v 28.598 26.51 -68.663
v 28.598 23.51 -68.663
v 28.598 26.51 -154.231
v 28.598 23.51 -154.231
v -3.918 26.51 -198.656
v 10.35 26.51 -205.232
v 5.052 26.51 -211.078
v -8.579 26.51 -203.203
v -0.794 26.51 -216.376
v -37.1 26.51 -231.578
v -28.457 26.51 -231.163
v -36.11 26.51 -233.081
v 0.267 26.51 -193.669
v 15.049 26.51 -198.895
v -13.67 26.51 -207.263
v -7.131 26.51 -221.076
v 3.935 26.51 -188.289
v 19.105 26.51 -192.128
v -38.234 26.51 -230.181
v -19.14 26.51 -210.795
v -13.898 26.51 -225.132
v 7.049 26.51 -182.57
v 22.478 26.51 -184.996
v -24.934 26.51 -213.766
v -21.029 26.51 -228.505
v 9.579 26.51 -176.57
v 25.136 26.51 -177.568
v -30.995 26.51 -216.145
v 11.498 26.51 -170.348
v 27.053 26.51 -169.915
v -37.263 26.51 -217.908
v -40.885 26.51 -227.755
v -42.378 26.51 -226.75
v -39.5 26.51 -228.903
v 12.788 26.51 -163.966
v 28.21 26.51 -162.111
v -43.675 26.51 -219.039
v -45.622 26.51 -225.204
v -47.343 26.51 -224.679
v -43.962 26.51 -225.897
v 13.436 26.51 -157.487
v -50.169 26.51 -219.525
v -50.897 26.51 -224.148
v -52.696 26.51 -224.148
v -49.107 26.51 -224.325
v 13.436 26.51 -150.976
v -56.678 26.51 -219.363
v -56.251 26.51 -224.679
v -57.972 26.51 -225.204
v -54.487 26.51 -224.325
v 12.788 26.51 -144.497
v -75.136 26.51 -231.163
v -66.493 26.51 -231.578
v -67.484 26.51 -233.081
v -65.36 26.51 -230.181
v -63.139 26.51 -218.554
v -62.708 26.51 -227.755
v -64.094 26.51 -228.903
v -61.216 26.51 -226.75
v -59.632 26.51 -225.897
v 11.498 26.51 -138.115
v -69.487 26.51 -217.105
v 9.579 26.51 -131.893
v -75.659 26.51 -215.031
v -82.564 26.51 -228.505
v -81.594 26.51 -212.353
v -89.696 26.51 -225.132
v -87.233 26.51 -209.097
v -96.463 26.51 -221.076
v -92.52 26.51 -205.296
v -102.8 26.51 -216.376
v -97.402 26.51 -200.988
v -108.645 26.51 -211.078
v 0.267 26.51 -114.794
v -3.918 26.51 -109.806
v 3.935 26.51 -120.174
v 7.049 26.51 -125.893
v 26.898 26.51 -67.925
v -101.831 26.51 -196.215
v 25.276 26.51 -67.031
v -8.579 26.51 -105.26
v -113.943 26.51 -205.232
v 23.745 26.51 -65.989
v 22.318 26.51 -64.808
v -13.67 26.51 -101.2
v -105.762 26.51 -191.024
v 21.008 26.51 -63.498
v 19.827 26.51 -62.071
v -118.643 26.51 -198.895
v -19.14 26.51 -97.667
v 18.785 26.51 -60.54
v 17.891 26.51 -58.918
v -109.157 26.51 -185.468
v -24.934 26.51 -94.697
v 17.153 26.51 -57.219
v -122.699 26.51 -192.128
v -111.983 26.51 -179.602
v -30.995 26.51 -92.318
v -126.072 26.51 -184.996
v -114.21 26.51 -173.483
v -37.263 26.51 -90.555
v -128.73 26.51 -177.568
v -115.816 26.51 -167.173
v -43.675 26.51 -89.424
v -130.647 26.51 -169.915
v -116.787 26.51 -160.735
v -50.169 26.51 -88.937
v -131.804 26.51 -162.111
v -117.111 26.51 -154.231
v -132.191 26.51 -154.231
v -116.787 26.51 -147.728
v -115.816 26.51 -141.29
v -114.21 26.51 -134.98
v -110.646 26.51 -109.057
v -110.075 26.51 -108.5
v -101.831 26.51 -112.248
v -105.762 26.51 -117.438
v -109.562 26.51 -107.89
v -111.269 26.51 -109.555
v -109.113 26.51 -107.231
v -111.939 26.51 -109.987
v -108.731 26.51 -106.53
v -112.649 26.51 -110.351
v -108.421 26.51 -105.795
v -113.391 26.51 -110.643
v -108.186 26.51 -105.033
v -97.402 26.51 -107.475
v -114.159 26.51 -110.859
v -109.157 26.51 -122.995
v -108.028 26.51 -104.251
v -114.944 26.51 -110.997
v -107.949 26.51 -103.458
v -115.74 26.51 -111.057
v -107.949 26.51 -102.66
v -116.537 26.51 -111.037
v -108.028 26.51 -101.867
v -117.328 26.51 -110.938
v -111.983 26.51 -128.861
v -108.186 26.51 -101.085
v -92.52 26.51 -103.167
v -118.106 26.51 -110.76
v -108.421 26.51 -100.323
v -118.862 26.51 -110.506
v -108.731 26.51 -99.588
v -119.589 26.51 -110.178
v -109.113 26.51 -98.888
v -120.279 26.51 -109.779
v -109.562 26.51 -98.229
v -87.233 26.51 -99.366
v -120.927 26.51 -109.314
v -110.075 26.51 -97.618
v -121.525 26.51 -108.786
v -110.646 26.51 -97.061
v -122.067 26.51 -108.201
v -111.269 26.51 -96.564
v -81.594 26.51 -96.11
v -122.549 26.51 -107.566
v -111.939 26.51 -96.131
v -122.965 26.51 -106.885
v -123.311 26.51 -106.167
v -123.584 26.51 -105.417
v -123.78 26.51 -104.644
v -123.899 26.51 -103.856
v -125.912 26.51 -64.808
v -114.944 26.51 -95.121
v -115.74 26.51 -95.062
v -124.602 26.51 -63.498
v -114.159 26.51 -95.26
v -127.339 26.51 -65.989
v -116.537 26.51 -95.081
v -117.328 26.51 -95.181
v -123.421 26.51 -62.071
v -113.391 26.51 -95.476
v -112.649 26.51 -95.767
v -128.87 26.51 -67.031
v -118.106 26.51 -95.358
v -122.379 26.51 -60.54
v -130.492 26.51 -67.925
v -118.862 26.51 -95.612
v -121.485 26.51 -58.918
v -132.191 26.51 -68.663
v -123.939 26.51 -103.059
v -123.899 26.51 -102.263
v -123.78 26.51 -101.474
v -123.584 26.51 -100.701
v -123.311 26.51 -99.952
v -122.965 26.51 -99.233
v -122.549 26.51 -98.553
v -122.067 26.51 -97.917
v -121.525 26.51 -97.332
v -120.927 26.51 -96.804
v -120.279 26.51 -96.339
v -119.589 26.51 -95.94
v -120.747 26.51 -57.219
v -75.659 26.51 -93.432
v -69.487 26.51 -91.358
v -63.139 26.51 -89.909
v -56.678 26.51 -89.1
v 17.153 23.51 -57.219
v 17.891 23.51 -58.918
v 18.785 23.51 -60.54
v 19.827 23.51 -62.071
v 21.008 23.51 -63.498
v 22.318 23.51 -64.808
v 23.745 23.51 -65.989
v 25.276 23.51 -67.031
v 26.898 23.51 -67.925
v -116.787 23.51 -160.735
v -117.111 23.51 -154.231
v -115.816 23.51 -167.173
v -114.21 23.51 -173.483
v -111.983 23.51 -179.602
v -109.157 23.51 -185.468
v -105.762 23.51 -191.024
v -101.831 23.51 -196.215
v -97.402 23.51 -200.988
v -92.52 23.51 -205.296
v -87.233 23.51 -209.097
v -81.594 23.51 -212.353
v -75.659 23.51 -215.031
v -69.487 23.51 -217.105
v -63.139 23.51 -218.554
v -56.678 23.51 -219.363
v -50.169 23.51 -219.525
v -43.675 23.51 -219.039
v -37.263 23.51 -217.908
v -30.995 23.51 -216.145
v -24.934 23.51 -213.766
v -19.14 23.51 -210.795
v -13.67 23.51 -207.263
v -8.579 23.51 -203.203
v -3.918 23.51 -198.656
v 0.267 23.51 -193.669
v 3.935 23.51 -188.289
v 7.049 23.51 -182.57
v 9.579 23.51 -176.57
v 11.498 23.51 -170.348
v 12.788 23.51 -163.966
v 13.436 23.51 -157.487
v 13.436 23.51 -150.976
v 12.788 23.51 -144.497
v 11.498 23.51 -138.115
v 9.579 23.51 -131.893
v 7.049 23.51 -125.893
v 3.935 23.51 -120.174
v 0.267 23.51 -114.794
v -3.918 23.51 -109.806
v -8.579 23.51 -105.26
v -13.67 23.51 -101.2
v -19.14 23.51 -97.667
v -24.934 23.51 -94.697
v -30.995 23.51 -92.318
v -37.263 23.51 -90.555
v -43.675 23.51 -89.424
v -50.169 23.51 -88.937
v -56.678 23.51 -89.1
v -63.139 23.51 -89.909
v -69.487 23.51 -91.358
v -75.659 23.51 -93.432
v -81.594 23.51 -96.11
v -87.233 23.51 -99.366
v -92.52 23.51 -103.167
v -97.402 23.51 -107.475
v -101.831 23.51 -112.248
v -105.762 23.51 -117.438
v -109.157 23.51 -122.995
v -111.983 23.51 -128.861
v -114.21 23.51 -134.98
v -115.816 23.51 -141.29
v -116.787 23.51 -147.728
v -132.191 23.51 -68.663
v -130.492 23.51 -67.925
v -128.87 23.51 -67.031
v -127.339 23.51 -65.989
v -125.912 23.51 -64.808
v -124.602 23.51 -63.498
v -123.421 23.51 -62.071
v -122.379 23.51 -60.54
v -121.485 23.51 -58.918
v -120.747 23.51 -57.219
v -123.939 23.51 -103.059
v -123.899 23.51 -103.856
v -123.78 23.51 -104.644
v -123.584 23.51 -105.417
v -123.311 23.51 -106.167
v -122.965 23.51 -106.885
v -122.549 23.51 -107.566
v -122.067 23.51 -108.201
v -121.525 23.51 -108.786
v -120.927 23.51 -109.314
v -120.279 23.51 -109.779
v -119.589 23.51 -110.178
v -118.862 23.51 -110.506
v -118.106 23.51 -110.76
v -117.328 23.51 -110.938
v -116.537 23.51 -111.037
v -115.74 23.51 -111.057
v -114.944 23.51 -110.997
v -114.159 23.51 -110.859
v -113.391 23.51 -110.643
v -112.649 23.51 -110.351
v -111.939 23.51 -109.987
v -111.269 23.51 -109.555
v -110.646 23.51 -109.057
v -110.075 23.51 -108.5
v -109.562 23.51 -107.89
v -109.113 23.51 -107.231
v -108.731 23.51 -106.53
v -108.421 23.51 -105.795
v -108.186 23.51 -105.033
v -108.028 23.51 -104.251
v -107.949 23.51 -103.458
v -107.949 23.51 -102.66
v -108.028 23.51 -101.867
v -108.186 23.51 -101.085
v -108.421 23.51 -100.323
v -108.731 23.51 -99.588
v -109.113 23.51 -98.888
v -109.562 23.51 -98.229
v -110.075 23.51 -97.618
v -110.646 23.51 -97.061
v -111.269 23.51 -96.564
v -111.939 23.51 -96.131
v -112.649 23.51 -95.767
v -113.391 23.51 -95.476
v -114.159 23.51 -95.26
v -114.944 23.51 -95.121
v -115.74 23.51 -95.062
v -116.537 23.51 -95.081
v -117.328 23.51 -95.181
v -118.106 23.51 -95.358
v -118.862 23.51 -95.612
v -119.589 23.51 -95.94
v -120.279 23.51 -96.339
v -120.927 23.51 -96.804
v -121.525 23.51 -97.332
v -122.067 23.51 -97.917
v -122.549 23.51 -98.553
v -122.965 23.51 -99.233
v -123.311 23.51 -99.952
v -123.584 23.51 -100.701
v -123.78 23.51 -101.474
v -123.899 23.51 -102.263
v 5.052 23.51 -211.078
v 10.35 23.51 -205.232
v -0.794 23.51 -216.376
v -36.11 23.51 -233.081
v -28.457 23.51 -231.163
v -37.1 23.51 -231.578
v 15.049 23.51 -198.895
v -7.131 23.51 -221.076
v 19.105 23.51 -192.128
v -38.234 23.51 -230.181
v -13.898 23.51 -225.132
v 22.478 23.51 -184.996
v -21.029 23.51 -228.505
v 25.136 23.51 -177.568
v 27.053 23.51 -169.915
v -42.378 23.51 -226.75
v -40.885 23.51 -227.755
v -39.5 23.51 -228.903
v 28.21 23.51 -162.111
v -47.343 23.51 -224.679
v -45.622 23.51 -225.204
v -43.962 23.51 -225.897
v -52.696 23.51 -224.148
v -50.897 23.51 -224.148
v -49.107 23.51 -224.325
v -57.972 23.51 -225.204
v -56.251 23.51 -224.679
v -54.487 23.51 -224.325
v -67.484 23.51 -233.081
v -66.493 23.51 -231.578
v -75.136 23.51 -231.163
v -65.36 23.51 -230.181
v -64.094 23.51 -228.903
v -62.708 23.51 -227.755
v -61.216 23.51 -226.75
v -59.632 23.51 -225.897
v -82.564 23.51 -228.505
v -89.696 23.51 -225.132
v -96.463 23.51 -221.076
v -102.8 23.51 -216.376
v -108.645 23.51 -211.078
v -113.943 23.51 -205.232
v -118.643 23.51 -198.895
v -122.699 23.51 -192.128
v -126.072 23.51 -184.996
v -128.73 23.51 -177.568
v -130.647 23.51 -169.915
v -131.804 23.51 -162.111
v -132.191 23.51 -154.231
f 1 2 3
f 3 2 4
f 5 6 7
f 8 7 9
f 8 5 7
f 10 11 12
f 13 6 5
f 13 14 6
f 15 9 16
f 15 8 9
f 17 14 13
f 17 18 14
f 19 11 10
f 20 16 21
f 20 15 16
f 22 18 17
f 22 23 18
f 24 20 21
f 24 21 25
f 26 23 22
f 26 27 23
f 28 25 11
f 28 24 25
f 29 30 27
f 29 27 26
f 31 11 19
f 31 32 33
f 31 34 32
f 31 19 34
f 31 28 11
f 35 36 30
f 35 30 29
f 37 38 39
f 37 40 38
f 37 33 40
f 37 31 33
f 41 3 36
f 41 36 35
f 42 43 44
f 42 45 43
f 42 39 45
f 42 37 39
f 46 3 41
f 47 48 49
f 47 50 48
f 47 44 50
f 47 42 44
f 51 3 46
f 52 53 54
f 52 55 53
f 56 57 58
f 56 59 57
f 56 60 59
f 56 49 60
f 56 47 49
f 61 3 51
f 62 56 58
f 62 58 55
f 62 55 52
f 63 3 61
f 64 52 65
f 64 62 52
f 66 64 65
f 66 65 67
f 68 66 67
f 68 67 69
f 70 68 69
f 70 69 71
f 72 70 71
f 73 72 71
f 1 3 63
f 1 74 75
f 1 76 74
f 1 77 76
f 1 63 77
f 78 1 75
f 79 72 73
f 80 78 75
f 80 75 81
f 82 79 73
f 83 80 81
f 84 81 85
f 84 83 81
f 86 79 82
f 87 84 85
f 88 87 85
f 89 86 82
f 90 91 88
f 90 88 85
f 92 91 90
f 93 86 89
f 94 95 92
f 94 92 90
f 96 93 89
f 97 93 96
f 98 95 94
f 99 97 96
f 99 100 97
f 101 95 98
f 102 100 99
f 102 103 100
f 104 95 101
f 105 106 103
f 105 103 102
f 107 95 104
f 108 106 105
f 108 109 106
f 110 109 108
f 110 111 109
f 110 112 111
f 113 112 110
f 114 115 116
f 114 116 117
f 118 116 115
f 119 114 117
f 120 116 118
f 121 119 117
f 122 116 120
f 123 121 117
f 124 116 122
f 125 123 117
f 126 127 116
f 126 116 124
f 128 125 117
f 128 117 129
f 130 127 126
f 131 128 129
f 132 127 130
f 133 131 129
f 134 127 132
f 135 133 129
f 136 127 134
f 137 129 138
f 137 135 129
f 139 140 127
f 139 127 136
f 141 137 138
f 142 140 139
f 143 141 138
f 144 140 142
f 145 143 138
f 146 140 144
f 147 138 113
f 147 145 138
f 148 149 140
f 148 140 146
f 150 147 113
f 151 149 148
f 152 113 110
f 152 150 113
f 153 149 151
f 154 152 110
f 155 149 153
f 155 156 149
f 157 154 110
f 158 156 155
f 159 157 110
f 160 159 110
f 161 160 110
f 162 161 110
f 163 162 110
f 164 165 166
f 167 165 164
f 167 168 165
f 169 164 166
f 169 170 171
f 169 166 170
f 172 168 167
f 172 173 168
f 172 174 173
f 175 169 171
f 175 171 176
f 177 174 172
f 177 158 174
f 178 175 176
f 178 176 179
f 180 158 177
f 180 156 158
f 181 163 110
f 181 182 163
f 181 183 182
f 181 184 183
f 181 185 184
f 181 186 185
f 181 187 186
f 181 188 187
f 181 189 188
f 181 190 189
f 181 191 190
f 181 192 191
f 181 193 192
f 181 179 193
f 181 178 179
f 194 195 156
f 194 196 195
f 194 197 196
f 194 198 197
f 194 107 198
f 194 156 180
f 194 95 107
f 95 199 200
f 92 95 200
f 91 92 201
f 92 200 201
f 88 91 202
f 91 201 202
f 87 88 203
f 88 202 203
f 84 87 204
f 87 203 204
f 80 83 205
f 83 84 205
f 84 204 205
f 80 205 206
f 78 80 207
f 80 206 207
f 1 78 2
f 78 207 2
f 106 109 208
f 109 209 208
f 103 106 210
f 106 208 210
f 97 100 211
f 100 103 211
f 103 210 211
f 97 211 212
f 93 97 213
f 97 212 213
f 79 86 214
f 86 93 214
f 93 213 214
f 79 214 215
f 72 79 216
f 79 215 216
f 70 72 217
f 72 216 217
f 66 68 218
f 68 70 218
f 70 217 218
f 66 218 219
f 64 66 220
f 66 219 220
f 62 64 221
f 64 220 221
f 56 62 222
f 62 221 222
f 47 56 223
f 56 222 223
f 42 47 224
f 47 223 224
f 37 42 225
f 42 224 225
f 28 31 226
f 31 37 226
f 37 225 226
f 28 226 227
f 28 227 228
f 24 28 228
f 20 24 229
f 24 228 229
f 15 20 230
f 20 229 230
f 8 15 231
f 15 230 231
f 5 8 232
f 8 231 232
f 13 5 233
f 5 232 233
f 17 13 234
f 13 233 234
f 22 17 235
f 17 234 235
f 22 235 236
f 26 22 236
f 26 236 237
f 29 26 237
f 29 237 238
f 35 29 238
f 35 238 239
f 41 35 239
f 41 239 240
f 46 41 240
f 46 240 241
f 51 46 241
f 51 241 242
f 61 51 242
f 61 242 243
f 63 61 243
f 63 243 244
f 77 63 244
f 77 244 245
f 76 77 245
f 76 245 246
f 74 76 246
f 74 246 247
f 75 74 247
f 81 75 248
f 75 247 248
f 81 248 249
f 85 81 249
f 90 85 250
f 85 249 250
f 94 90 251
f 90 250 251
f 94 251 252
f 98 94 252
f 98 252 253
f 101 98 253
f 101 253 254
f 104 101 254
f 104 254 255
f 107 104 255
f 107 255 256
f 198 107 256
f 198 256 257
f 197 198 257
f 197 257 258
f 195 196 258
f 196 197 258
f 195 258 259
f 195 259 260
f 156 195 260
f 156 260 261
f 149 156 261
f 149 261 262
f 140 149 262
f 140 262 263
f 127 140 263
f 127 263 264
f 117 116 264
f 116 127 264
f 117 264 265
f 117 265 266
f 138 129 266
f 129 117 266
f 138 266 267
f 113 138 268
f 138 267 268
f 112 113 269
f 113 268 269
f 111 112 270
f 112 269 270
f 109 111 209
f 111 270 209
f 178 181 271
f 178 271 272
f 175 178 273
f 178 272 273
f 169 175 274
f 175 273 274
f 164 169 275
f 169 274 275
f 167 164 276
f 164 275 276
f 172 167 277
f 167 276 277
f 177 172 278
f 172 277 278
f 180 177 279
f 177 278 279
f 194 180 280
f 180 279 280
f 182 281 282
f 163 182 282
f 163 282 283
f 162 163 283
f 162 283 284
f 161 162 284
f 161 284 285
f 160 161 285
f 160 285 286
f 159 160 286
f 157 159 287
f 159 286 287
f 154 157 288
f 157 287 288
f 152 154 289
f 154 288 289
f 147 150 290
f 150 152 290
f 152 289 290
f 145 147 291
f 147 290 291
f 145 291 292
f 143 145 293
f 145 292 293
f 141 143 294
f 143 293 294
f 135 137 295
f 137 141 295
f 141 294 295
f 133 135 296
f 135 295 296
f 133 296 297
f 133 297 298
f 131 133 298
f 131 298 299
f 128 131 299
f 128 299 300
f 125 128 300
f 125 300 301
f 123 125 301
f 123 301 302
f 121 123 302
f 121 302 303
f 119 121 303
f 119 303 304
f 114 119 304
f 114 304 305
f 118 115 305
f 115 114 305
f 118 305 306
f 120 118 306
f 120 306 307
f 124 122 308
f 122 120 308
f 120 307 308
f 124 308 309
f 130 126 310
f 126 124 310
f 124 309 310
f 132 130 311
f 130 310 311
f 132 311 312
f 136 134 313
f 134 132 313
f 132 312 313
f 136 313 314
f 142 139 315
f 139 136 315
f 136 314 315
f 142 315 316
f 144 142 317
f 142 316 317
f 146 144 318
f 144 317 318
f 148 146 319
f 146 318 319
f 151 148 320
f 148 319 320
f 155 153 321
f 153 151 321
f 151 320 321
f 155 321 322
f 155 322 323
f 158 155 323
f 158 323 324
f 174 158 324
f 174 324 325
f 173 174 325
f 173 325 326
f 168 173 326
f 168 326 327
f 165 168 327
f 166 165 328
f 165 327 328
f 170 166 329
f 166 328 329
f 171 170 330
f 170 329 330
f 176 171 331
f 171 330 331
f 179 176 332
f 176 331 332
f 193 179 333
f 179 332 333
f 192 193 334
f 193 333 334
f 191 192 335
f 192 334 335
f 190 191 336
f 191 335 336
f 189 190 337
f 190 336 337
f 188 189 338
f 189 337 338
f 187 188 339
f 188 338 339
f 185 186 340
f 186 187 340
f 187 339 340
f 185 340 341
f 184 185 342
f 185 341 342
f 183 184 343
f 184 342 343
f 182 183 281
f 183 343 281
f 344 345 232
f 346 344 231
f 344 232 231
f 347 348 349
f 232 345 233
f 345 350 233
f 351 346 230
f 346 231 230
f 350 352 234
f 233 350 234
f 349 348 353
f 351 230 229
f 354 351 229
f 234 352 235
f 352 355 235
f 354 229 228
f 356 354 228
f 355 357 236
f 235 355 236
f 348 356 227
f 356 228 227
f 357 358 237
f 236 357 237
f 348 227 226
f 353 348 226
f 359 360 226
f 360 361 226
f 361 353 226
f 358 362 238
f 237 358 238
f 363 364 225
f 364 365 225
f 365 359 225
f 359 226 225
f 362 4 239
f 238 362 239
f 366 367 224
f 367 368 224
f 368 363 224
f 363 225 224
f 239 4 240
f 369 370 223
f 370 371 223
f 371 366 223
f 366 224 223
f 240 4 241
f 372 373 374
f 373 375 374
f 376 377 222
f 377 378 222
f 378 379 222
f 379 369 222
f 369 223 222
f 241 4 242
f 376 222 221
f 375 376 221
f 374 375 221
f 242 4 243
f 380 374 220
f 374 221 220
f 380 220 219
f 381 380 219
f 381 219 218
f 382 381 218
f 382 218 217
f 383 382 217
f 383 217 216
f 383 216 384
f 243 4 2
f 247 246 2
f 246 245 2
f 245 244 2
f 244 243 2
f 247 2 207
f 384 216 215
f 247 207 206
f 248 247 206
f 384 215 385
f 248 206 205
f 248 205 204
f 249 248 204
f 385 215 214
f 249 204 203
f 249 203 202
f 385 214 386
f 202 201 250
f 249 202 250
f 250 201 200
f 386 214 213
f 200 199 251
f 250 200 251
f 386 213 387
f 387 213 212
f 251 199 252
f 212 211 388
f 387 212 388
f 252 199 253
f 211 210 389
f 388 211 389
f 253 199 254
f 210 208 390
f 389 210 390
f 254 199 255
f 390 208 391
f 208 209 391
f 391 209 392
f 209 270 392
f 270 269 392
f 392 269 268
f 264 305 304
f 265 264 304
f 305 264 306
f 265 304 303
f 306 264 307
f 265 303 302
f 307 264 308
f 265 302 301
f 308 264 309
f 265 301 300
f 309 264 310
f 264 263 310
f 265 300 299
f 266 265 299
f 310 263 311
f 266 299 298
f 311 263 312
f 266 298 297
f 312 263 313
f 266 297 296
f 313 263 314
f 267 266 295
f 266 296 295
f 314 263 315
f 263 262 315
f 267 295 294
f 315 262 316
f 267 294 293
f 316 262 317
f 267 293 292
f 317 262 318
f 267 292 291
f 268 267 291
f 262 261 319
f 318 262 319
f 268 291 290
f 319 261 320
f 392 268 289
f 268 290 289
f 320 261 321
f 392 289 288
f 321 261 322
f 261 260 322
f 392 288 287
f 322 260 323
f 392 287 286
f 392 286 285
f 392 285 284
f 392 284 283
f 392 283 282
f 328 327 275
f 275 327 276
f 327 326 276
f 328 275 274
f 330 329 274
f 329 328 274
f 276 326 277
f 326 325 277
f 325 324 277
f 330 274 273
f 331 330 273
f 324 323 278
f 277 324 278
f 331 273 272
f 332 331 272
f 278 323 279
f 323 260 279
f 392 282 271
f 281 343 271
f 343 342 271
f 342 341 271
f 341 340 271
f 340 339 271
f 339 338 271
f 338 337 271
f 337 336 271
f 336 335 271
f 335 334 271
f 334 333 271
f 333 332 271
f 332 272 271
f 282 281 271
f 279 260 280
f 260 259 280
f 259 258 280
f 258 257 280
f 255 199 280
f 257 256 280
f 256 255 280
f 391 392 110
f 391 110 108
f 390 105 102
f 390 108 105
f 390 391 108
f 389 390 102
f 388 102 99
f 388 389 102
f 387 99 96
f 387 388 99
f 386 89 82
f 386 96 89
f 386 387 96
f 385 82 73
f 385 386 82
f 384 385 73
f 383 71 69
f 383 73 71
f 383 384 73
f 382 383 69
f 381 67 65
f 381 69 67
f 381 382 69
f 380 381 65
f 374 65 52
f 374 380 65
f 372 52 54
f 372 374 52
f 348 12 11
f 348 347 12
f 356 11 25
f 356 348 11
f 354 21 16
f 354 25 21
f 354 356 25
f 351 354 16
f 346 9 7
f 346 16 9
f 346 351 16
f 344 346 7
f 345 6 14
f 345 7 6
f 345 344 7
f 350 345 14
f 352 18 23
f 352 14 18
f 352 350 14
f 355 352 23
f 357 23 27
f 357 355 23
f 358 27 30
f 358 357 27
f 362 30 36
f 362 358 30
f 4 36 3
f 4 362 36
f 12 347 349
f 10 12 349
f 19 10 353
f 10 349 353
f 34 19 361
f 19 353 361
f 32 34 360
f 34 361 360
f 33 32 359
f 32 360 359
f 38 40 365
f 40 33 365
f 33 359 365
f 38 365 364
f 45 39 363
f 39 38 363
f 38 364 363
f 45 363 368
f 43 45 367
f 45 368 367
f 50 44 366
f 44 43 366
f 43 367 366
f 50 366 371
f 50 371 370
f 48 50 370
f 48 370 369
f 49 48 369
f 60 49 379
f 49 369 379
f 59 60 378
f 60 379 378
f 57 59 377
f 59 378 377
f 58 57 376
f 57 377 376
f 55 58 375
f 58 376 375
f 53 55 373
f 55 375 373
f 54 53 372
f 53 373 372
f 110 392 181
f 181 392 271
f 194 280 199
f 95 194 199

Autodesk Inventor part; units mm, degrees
ref_plane "YZ Plane" through (0, 0, 0) normal (1, 0, 0) x (0, 1, 0)
ref_plane "XZ Plane" through (0, 0, 0) normal (0, 1, 0) x (-1, 0, 0)
ref_plane "XY Plane" through (0, 0, 0) normal (0, 0, 1) x (1, 0, 0)
ref_plane "Work Plane1" through (-51.7969, 23.5104, -145.9222) normal (0, 1, 0) x (-1, 0, 0)
sketch "Sketch1" plane through (-51.7969, 23.5104, -145.9222) normal (0, 1, 0) x (-1, 0, 0)
  circle A0 centre (64.1421, 42.8631) radius 8 projected
  circle A1 centre (0, -8.3092) radius 65.3144 projected
  line L0 (80.3944, -8.3092) -> (80.3944, 77.2593) projected
  arc A2 (68.9502, 88.7036) -> (80.3944, 77.2593) centre (87.3944, 95.7036) ccw projected
  line L1 (68.9502, 88.7036) -> (-68.9502, 88.7036) projected
  arc A3 (-80.3944, 77.2593) -> (-68.9502, 88.7036) centre (-87.3944, 95.7036) ccw projected
  line L2 (-80.3944, 77.2593) -> (-80.3944, -8.3092) projected
  arc A4 (-80.3944, -8.3092) -> (-15.6866, -87.1584) centre (0, -8.3092) ccw projected
  arc A5 (15.6866, -87.1584) -> (-15.6866, -87.1584) centre (0, -96.4205) ccw projected
  arc A6 (15.6866, -87.1584) -> (80.3944, -8.3092) centre (0, -8.3092) ccw projected
  point P0 (-51.7969, 145.9222)
extrude "Extrusion1" add sketch "Sketch1" along normal blind 3
properties part number "pcb"
